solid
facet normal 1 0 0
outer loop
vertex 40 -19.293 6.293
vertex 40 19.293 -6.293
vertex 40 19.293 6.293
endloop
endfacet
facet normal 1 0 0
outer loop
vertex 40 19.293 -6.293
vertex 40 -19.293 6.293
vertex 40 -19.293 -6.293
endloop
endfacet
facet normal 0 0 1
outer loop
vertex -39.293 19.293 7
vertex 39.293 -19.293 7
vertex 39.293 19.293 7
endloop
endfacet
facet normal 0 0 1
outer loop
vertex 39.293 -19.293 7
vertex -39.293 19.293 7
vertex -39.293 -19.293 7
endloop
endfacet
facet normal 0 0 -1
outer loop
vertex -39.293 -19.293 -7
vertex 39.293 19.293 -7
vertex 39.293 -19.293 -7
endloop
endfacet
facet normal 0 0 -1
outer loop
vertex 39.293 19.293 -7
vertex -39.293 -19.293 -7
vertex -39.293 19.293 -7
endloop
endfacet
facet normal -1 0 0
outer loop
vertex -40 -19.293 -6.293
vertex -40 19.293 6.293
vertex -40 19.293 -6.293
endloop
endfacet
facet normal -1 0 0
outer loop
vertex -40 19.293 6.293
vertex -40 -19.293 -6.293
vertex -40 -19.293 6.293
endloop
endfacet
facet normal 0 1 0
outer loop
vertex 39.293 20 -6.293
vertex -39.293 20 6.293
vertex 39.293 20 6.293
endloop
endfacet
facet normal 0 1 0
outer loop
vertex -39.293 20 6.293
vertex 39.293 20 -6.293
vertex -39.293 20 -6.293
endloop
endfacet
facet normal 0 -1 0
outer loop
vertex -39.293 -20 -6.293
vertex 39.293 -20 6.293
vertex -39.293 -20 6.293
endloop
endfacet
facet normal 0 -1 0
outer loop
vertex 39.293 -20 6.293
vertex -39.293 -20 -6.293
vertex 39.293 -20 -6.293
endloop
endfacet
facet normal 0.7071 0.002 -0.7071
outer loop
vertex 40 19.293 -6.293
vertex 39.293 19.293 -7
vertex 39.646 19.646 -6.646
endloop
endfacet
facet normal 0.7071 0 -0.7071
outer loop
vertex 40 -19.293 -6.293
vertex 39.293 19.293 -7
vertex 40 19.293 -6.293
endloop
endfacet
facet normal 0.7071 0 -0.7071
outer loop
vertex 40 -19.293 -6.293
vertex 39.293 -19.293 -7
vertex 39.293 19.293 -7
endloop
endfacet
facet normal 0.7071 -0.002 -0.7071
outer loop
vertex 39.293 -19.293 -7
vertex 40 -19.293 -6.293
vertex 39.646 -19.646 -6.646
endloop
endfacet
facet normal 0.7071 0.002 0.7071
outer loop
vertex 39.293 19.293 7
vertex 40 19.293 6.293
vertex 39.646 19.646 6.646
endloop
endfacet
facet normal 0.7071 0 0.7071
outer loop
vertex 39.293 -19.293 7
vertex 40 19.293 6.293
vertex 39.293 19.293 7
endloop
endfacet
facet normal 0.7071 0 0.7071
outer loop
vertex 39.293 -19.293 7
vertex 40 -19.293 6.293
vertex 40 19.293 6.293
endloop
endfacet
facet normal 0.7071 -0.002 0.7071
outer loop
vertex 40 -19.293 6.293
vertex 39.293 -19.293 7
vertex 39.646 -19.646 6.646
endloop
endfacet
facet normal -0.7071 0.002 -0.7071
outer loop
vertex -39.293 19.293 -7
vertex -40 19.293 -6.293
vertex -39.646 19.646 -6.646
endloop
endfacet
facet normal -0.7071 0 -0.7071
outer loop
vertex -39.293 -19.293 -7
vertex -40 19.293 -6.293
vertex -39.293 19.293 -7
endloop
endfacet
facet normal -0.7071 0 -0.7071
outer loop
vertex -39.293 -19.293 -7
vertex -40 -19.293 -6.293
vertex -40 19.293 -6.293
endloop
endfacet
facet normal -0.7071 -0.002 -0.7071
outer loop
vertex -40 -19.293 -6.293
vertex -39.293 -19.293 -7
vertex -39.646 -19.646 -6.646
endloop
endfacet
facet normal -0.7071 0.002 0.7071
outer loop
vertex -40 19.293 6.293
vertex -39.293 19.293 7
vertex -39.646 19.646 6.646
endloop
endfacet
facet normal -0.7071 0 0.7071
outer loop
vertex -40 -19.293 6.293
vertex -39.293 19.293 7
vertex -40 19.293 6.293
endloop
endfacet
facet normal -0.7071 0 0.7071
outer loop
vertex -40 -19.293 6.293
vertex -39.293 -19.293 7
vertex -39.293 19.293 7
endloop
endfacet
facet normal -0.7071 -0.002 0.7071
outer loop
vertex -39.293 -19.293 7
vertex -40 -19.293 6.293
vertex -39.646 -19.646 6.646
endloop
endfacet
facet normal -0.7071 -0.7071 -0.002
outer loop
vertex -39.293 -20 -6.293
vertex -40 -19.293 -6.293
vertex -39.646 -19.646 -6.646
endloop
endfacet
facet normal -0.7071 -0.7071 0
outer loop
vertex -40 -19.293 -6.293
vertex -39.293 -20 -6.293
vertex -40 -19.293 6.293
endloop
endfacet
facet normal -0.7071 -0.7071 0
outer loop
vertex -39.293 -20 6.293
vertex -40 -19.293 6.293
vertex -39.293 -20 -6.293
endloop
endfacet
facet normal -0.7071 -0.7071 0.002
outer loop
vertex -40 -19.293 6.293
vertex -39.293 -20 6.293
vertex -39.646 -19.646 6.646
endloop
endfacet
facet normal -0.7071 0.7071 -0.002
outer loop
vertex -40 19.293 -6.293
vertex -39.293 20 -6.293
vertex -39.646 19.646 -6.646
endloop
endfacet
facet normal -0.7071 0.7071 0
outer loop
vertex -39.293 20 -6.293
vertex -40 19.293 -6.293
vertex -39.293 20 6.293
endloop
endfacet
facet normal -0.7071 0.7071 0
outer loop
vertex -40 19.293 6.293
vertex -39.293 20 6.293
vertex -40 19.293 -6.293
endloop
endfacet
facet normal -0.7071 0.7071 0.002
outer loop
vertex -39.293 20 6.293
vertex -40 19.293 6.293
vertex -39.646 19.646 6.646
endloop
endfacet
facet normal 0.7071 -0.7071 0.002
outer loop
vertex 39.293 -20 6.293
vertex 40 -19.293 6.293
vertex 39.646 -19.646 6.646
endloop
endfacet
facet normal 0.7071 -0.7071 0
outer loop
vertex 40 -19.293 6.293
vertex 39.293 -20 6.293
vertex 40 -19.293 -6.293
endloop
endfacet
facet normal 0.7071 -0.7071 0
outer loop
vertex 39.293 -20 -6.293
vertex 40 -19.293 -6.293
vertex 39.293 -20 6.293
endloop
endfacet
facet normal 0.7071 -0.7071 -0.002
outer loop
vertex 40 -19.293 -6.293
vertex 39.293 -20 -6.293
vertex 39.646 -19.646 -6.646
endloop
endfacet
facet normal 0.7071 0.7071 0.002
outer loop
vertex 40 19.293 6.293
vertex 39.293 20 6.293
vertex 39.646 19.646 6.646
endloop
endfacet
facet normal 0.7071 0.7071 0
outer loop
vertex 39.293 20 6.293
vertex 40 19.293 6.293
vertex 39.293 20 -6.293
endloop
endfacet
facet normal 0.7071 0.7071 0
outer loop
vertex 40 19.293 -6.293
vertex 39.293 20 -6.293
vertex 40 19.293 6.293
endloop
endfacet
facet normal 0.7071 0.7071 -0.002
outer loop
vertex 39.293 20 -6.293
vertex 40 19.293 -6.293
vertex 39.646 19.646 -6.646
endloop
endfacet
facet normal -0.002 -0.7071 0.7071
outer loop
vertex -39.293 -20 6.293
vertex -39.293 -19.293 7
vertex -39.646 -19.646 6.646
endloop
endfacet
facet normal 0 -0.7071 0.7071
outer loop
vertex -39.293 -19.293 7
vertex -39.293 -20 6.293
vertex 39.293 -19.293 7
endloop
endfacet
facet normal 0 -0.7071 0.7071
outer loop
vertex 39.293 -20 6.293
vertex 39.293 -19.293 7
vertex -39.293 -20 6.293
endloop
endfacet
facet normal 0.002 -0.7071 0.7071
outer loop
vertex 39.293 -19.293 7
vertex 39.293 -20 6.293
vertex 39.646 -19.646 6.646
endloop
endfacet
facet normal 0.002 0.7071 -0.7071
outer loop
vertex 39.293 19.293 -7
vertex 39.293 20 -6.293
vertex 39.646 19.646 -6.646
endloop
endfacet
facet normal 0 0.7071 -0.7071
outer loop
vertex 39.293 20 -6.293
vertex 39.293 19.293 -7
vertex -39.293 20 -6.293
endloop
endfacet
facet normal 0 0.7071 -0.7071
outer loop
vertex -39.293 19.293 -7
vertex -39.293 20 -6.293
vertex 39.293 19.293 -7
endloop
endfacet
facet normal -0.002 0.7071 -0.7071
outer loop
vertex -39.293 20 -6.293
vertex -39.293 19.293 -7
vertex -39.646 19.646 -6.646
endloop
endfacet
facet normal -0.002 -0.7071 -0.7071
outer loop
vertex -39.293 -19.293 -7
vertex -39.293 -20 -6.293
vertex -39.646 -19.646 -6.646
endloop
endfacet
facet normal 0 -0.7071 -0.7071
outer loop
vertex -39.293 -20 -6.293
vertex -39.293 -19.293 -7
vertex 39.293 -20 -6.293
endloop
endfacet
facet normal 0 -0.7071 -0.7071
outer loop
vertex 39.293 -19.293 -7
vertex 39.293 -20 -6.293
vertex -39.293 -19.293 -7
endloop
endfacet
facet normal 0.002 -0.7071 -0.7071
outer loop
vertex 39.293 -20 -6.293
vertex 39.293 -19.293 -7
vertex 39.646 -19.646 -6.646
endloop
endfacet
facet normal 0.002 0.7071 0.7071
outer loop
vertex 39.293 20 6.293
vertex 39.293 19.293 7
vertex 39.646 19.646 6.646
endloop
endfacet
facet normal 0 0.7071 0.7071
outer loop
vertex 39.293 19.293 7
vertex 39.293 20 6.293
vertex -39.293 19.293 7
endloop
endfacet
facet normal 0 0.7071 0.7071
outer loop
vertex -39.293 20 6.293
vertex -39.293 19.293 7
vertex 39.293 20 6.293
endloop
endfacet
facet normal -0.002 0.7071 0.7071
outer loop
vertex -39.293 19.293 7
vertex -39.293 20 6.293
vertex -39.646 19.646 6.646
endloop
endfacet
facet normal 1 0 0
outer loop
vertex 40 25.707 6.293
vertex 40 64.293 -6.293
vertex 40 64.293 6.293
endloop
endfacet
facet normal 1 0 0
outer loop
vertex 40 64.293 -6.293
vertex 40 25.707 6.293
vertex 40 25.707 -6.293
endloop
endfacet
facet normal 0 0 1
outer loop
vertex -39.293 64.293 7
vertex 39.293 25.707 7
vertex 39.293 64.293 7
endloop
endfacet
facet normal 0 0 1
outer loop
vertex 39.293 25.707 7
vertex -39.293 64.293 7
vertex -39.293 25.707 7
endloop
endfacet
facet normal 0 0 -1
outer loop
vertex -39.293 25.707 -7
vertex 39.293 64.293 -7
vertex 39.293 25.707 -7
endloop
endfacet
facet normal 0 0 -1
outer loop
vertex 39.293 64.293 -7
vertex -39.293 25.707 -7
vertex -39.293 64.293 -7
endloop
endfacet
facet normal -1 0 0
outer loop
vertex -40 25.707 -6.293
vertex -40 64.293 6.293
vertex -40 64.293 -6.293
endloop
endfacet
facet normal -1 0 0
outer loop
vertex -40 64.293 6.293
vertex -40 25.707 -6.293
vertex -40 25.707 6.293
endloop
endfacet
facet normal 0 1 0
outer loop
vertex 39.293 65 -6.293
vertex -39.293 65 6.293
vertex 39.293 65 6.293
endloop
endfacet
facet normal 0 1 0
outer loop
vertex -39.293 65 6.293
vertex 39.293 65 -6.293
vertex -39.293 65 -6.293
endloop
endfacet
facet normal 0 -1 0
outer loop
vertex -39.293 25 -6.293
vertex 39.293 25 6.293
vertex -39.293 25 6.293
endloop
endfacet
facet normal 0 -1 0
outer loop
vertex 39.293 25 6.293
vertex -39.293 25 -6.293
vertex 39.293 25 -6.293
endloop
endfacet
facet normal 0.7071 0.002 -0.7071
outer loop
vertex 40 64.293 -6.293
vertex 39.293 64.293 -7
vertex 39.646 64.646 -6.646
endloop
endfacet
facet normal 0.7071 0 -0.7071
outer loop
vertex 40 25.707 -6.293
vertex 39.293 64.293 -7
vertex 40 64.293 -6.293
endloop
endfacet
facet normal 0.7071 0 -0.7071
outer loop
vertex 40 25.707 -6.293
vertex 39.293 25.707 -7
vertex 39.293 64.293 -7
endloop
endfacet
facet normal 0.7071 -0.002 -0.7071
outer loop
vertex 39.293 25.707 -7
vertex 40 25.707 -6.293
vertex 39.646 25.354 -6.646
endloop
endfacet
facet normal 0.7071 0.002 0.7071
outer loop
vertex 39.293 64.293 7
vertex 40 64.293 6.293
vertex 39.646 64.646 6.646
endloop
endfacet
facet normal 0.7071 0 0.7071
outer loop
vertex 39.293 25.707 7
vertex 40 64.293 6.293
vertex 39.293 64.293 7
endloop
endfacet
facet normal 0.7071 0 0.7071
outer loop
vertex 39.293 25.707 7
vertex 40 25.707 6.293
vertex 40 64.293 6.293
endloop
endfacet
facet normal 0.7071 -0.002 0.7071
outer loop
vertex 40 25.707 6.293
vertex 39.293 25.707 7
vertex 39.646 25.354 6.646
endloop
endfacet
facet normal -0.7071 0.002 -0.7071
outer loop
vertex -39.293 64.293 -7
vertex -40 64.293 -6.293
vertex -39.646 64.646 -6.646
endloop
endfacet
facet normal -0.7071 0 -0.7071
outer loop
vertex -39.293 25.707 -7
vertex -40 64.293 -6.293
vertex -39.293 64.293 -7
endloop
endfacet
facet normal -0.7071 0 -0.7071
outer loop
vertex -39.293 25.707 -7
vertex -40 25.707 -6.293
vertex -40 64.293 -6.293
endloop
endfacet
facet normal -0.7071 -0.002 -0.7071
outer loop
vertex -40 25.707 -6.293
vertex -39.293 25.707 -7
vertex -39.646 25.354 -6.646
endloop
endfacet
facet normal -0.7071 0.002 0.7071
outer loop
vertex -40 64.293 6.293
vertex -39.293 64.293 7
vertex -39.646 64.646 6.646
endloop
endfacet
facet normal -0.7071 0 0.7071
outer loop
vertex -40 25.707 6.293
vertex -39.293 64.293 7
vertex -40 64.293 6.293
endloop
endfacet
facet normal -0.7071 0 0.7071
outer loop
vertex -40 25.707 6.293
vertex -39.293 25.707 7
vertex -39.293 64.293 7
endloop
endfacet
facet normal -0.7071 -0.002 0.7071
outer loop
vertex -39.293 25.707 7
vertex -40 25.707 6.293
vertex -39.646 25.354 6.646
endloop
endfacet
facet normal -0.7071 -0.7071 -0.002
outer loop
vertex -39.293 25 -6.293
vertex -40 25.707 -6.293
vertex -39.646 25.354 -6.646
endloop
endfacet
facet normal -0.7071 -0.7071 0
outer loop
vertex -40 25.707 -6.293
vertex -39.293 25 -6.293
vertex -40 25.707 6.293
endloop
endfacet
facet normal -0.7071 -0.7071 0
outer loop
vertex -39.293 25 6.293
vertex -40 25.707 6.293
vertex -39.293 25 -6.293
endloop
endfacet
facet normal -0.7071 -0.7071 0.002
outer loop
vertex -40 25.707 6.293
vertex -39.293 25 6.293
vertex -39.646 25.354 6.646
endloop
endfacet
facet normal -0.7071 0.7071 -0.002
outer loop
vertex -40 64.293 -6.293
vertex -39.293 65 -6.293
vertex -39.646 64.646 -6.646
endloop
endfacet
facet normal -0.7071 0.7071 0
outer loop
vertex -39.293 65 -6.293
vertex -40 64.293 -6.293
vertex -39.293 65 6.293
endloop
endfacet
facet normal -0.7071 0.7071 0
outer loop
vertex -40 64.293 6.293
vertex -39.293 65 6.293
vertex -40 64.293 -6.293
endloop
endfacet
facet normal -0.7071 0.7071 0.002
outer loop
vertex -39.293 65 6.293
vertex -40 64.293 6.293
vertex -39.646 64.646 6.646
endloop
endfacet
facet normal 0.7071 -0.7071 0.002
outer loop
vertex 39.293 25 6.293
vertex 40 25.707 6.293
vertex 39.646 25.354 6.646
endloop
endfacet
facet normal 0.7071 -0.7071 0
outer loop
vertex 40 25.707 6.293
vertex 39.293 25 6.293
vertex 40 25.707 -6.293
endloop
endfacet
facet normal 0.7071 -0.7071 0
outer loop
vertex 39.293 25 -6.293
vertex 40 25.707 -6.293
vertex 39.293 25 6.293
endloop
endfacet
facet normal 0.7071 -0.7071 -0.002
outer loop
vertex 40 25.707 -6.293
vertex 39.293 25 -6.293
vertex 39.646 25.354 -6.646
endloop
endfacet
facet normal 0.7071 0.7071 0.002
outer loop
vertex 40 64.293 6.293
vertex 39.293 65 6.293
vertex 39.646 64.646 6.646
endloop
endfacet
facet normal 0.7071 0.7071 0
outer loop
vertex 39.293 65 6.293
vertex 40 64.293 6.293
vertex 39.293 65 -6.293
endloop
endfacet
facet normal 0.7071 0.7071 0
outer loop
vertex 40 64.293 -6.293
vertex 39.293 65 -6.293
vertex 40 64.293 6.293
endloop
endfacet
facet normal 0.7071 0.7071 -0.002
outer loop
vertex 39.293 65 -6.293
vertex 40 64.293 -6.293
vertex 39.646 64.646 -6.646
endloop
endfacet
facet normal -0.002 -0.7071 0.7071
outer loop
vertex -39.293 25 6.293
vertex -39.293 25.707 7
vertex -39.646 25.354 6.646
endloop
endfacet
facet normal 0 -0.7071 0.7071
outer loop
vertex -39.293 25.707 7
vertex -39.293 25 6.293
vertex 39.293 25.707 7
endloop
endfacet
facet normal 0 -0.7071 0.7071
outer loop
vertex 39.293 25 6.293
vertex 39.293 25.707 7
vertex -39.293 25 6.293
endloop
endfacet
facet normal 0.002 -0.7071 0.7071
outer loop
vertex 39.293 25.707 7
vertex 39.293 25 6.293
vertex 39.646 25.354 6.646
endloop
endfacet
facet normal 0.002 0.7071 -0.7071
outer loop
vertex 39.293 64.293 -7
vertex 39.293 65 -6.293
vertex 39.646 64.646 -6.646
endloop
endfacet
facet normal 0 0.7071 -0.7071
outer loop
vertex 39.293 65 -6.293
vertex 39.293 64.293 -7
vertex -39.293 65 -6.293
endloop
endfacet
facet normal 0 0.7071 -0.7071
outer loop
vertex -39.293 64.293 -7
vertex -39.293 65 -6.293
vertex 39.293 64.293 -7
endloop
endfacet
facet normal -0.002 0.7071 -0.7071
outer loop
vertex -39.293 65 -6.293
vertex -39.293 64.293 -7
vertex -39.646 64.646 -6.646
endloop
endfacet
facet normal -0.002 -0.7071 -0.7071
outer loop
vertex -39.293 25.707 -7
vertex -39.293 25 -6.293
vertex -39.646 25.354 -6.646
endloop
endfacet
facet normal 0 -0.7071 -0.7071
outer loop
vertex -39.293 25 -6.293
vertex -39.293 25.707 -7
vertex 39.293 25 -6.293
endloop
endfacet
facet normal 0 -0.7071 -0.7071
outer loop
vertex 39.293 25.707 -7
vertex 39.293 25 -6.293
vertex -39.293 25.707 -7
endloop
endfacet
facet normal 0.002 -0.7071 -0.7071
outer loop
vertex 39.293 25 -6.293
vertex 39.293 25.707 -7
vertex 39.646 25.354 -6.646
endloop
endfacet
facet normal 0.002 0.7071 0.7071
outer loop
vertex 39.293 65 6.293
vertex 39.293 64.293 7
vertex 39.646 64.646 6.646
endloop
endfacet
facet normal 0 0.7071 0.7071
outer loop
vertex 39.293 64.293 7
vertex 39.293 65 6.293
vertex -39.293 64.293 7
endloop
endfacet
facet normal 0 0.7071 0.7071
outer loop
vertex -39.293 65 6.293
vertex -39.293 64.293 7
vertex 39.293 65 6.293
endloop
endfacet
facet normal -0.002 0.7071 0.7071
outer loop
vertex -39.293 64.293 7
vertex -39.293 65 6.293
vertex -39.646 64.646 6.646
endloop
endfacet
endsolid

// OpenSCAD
joiner_width = 40;
joiner_height = 14;

module cut_cube(dim) {
  cut = 1;
  a = (dim[0] + dim[2])/sqrt(2)-cut;
  b = (dim[0] + dim[1])/sqrt(2)-cut;
  c = (dim[1] + dim[2])/sqrt(2)-cut;
  intersection() {
    cube(dim, center=true);
    rotate([0,45,0]) cube([a,dim[1]*2,a],center=true);
    rotate([0,0,45]) cube([b,b,dim[2]*2],center=true);
    rotate([45,0,0]) cube([dim[0]*2,c,c],center=true);
  }
}

module bar() {
  cut_cube([80, joiner_width, joiner_height]);
}

module corner() {
  translate([20,0,0]) cut_cube([80, joiner_width, joiner_height]);
  rotate([0,0,90]) translate([20,0,0]) cut_cube([80, joiner_width, joiner_height]);

}


module corners_x4() {
  corner();
  translate([85,45,0]) rotate([0,0,180]) corner();
  translate([0,90,0]) {
  corner();
  translate([85,45,0]) rotate([0,0,180]) corner();
  }
}

module corners_x2() {
  corner();
  translate([85,45,0]) rotate([0,0,180]) corner();
}

module stairs_handle() {
  a = atan(1/2);
  x = 1;
  module half() {
    intersection() {
    rotate([0,-a/2,0]) translate([25-x,0,joiner_height/2]) cut_cube([50,joiner_width, joiner_height]);
      translate([500,0,0]) cube([1000,1000,1000],center=true);
    }
  }
  half();
  mirror([1,0,0]) half();
}

module stairs_handle_x2() {
  rotate([90,0,0]) {
    stairs_handle();
    translate([0,0,20]) stairs_handle(); 
  }
}

//stairs_handle_x2();
//corners_x2();

module bar_x8() {
  for(x=[1:6]) {
    translate([0,18*x,0])
    rotate([90,0,0]) bar();
  }
  for(x=[-1,1]) translate([x*50,60,0]) rotate([90,0,90]) bar();
}
//bar_x8();

module bar_x2_h() {
  bar();
  translate([0,45,0]) bar();
}
bar_x2_h();
